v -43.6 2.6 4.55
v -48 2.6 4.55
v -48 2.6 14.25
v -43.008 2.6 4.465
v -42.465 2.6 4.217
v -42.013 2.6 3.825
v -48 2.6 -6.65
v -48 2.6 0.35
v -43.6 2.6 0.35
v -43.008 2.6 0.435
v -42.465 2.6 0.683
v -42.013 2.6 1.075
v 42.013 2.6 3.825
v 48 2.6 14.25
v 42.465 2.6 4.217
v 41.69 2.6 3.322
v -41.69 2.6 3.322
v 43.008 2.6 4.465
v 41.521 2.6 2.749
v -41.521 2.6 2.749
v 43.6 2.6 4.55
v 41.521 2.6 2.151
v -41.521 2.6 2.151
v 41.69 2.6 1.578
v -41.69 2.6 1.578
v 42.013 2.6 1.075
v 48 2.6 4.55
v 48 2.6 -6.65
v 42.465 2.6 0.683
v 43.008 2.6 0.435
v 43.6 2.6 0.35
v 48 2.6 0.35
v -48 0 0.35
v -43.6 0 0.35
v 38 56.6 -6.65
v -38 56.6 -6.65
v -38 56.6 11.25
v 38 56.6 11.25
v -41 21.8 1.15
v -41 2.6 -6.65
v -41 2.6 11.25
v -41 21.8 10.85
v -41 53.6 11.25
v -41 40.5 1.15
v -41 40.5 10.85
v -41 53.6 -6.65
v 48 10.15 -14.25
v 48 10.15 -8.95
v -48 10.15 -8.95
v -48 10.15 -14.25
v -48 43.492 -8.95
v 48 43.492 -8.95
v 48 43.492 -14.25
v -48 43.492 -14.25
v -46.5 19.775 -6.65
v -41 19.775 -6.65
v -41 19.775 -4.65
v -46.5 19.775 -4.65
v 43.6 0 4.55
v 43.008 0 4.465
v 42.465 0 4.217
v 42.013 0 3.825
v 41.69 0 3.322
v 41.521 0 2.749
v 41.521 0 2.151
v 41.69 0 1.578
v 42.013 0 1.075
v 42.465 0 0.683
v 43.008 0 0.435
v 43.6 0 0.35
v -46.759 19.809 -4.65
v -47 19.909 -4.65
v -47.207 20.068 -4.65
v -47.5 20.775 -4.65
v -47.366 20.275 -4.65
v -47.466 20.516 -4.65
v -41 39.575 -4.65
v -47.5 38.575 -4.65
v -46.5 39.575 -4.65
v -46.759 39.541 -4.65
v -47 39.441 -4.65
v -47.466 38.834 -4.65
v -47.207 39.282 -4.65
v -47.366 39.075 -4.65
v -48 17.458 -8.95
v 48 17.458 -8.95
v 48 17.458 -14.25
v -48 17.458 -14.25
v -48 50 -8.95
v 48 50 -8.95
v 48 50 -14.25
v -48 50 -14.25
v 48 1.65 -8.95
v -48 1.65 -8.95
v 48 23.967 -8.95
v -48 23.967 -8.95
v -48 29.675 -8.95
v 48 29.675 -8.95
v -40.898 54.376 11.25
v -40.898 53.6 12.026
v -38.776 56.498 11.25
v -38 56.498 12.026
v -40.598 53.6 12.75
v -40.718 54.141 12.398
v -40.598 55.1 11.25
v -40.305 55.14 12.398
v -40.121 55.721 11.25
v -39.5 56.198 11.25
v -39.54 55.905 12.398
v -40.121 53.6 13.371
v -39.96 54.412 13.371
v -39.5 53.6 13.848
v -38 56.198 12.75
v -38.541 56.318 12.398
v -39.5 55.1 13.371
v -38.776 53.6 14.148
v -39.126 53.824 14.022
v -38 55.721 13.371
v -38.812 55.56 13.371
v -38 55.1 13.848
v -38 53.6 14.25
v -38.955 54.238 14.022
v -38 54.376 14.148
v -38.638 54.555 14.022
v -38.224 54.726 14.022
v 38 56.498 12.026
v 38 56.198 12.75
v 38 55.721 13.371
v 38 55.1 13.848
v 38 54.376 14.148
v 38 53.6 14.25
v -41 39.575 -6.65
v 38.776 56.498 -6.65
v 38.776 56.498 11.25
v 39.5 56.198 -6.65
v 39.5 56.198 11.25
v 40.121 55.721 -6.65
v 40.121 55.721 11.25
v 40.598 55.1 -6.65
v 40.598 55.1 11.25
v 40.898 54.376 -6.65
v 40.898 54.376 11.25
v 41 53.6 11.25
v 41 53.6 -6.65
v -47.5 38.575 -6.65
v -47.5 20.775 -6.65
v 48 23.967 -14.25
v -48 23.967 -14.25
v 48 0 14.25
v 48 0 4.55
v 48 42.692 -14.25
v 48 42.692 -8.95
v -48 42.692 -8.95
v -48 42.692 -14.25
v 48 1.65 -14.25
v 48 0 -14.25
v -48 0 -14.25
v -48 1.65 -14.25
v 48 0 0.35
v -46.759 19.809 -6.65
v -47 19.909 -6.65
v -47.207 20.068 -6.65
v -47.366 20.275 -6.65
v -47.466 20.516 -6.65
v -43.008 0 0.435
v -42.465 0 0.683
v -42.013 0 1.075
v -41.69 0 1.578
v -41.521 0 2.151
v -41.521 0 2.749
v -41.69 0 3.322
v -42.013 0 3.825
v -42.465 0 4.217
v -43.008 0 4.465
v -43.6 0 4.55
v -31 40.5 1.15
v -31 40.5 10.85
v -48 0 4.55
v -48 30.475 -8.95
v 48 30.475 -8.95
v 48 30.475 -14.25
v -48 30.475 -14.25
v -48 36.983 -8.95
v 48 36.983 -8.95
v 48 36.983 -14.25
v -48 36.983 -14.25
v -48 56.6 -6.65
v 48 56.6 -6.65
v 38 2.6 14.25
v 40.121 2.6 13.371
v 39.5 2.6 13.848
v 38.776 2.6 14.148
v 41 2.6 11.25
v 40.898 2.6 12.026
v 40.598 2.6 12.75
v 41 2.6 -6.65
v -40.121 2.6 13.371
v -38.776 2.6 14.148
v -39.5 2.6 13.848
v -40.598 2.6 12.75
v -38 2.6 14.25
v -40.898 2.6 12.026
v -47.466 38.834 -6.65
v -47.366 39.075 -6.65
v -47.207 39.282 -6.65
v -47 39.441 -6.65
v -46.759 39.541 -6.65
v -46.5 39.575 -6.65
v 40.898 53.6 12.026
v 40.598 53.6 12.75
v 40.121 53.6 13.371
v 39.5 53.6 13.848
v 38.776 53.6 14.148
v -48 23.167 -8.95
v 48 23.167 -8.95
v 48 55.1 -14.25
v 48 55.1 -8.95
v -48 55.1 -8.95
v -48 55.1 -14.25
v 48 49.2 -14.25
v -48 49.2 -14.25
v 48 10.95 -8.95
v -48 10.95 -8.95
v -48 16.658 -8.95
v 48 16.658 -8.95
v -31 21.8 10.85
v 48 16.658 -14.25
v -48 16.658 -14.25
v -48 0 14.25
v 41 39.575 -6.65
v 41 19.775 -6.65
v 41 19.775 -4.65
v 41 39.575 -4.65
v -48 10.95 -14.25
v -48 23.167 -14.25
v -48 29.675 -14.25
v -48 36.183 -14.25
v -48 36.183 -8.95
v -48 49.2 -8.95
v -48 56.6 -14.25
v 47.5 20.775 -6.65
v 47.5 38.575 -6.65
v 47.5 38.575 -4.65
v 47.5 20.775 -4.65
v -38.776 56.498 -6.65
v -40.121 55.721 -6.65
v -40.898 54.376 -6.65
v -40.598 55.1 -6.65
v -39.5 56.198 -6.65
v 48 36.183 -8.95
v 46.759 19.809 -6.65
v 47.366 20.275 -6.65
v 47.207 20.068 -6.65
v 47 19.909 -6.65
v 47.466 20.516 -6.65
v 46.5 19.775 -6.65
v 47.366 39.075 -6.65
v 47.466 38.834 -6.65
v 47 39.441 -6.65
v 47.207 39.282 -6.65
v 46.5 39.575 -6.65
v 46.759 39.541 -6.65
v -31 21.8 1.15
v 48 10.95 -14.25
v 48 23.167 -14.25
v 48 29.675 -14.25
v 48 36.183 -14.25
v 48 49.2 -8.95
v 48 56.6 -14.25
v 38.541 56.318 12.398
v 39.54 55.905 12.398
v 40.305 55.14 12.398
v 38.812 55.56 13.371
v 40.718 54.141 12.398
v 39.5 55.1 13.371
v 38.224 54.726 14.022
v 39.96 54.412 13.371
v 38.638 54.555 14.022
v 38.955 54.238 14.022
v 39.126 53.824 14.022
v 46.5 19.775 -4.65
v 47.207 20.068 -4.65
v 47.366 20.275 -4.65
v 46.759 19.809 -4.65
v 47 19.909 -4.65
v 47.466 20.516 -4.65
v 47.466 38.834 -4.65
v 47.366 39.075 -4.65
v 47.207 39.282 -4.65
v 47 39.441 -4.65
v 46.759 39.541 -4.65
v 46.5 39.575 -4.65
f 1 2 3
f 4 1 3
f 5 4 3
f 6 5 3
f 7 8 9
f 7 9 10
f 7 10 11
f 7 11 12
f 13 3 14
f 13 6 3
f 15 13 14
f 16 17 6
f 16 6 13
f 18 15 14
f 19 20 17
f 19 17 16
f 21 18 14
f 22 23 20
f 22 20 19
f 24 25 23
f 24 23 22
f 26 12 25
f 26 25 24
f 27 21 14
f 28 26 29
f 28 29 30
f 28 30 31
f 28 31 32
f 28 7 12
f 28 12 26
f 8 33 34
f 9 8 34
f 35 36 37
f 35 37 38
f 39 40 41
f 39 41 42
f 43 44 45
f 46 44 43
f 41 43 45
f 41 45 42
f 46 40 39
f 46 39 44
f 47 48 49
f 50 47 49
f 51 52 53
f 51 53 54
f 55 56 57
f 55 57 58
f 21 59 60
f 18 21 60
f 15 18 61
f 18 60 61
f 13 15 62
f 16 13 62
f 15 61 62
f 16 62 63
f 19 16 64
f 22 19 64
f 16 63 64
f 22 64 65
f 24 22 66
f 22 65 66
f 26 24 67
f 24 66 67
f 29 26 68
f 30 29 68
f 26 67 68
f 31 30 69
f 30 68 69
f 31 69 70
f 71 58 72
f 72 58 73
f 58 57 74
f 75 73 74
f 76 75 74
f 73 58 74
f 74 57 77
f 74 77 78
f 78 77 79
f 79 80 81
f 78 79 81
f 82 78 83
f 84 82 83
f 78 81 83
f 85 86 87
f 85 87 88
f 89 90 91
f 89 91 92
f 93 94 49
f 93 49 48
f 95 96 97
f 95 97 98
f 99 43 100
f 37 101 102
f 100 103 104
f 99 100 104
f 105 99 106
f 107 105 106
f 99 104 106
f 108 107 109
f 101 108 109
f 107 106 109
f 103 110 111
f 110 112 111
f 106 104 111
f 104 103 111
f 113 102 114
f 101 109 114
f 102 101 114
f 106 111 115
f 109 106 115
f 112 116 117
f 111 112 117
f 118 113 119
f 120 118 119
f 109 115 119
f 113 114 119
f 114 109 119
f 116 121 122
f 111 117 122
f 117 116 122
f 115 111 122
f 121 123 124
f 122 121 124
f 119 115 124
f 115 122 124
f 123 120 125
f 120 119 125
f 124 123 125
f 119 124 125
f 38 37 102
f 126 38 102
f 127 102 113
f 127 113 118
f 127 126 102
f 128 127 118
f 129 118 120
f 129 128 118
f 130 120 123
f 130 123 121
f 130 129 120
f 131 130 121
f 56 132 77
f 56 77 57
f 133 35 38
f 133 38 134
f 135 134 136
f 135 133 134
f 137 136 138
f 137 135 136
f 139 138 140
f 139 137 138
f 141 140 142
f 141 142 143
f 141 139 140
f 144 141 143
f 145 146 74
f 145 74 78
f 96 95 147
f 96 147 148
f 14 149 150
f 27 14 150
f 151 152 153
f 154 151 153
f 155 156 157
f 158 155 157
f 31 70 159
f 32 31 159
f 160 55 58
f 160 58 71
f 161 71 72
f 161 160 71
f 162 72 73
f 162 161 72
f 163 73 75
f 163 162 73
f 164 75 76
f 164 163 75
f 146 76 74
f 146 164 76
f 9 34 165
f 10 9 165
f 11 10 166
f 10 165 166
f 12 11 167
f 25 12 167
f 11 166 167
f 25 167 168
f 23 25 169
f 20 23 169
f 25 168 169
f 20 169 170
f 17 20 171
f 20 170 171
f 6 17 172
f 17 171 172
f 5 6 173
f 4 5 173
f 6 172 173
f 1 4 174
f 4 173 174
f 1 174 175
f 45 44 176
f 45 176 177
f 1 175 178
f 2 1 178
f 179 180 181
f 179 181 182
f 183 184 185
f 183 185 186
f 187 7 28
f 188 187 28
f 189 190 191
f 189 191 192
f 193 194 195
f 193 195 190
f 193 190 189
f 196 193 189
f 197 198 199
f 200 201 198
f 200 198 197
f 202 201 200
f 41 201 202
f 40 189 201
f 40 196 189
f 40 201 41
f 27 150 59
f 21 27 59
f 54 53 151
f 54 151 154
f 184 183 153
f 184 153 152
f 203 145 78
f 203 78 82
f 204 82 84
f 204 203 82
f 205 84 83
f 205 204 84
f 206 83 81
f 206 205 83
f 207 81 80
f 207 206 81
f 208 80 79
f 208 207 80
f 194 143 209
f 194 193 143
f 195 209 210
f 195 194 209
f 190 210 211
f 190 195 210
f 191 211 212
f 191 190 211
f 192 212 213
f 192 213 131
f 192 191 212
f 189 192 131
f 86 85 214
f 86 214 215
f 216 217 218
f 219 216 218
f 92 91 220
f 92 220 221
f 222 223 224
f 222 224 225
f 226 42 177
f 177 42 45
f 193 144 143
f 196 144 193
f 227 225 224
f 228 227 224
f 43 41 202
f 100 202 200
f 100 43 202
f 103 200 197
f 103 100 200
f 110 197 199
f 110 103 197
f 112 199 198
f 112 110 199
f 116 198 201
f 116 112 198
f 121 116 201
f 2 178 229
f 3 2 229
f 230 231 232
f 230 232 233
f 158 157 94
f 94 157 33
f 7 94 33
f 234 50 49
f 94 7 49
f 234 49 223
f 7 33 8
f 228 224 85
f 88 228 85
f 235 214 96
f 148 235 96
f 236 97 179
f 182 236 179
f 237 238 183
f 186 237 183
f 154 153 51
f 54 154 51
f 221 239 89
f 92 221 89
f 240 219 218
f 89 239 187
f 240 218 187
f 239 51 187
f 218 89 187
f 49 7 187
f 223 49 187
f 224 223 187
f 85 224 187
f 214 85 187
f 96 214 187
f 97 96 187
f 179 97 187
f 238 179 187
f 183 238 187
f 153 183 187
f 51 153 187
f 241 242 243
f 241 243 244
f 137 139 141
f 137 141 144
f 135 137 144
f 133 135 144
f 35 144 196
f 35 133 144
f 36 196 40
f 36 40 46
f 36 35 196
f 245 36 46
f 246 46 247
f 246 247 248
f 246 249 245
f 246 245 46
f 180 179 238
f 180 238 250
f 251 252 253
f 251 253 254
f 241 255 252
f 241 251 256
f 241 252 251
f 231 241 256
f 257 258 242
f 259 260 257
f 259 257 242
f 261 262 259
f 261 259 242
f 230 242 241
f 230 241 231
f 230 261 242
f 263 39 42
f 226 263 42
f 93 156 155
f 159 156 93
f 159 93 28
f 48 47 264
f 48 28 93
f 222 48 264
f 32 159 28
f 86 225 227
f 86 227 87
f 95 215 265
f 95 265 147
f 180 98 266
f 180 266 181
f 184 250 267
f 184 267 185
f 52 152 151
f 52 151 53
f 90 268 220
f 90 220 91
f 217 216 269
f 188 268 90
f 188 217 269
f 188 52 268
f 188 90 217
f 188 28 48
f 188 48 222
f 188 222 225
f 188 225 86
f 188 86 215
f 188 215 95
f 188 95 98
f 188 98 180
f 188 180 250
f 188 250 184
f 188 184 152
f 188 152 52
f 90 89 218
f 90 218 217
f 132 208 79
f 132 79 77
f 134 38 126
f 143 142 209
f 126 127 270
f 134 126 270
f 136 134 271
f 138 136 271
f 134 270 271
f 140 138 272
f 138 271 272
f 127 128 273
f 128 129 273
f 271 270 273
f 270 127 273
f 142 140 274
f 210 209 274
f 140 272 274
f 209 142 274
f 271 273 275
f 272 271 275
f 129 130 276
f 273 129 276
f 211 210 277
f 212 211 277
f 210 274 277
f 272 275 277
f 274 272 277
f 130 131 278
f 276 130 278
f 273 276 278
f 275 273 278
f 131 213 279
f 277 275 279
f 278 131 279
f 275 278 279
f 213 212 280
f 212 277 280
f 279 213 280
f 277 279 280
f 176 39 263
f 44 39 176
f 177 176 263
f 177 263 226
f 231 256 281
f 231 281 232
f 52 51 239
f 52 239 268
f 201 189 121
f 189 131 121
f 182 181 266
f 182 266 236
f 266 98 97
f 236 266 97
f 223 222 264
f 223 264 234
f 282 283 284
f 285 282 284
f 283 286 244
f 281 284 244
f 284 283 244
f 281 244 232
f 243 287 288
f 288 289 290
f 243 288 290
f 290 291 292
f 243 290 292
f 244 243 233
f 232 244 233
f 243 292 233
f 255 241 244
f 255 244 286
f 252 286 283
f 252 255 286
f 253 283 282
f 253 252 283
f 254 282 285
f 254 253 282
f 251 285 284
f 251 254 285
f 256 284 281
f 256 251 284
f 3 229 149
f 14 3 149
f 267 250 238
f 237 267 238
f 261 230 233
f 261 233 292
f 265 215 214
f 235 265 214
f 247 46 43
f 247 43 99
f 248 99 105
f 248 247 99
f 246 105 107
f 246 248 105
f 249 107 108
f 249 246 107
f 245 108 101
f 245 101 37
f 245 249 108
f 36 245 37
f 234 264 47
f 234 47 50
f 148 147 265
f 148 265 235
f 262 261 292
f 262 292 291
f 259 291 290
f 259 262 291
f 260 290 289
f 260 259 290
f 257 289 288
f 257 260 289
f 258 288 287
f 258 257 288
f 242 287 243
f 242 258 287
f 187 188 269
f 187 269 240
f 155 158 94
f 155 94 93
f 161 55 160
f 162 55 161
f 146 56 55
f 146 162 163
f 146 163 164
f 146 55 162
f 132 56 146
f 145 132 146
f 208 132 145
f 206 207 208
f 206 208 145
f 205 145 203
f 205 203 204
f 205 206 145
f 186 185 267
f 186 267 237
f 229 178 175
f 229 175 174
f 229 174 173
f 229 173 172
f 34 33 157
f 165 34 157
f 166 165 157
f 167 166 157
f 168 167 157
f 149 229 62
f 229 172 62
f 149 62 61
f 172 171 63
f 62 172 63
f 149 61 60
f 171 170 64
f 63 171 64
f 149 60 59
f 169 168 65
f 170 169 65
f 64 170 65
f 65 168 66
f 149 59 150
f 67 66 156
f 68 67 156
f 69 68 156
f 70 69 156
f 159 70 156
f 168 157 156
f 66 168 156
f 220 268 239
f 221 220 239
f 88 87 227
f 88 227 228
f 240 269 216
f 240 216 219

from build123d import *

# Parameters (mm, degrees)
RESSALTO_EXTRUS_O1_DEPTH   = 2.6
ESBO_O2_W                  = 96
ESBO_O2_H                  = 2.3
RESSALTO_EXTRUS_O2_DEPTH   = 54
ESBO_O3_W                  = 96
ESBO_O3_H                  = 5.3
CORTE_EXTRUS_O1_DEPTH      = 0.95
ESBO_O4_W                  = 96
ESBO_O4_H                  = 1.5
RESSALTO_EXTRUS_O3_DEPTH   = 5.3
ESBO_O5_W                  = 96
ESBO_O5_H                  = 0.8
EXTRUS_O_FINA1_DEPTH       = 5.3
RESSALTO_EXTRUS_O4_DEPTH   = 20.9
FILETE1_R                  = 3
ESBO_O7_W                  = 9.7
ESBO_O7_H                  = 18.7
CORTE_EXTRUS_O2_DEPTH      = 10
RESSALTO_EXTRUS_O5_DEPTH   = 2
RESSALTO_EXTRUS_O5_2_DEPTH = 2


with BuildPart() as part:
    # Esboço1 → Ressalto-extrusão1 (new body)
    with BuildSketch(Plane(origin=(0, 0, 0), x_dir=(1, 0, 0), z_dir=(0, 1, 0))):
        with BuildLine():
            Line((-48, -0.35), (-43.6, -0.35))
            ThreePointArc((-43.6, -0.35), (-41.5, -2.45), (-43.6, -4.55))
            Line((-43.6, -4.55), (-48, -4.55))
            Line((-48, -4.55), (-48, -14.25))
            Line((-48, -14.25), (48, -14.25))
            Line((48, -14.25), (48, -4.55))
            Line((48, -4.55), (43.6, -4.55))
            ThreePointArc((43.6, -4.55), (41.5, -2.45), (43.6, -0.35))
            Line((43.6, -0.35), (48, -0.35))
            Line((48, -0.35), (48, 14.25))
            Line((48, 14.25), (-48, 14.25))
            Line((-48, 14.25), (-48, -0.35))
        make_face()
    extrude(amount=RESSALTO_EXTRUS_O1_DEPTH)

    # Esboço2 → Ressalto-extrusão2 (add)
    with BuildSketch(Plane(origin=(0, 2.6, 0), x_dir=(1, 0, 0), z_dir=(0, 1, 0))):
        with Locations((0, 7.8)):
            Rectangle(ESBO_O2_W, ESBO_O2_H)
    extrude(amount=RESSALTO_EXTRUS_O2_DEPTH)

    # Esboço3 → Corte-extrusão1 (cut)
    with BuildSketch(Plane(origin=(0, 2.6, 0), x_dir=(1, 0, 0), z_dir=(0, 1, 0))):
        with Locations((0, 11.6)):
            Rectangle(ESBO_O3_W, ESBO_O3_H)
    extrude(amount=-CORTE_EXTRUS_O1_DEPTH, mode=Mode.SUBTRACT)

    # Esboço4 → Ressalto-extrusão3 (add)
    with BuildSketch(Plane(origin=(0, 0, -8.95), x_dir=(-1, 0, 0), z_dir=(0, 0, -1))):
        with Locations((0, 55.85)):
            Rectangle(ESBO_O4_W, ESBO_O4_H)
    extrude(amount=RESSALTO_EXTRUS_O3_DEPTH)

    # Esboço5 → Extrusão-Fina1 (add)
    with BuildSketch(Plane(origin=(0, 0, -8.95), x_dir=(-1, 0, 0), z_dir=(0, 0, -1))):
        with Locations((0, 49.6)):
            Rectangle(ESBO_O5_W, ESBO_O5_H)
        with Locations((0, 43.091666667)):
            Rectangle(ESBO_O5_W, ESBO_O5_H)
        with Locations((0, 36.583333333)):
            Rectangle(ESBO_O5_W, ESBO_O5_H)
        with Locations((0, 30.075)):
            Rectangle(ESBO_O5_W, ESBO_O5_H)
        with Locations((0, 23.566666667)):
            Rectangle(ESBO_O5_W, ESBO_O5_H)
        with Locations((0, 17.058333333)):
            Rectangle(ESBO_O5_W, ESBO_O5_H)
        with Locations((0, 10.55)):
            Rectangle(ESBO_O5_W, ESBO_O5_H)
    extrude(amount=EXTRUS_O_FINA1_DEPTH)


with BuildPart() as body_2:
    # Esboço6 → Ressalto-extrusão4 (new body)
    with BuildSketch(Plane.XY.offset(-6.65)):
        with BuildLine():
            Line((-38, 56.6), (38, 56.6))
            ThreePointArc((38, 56.6), (40.121320344, 55.721320344), (41, 53.6))
            Line((41, 53.6), (41, 2.6))
            Line((41, 2.6), (-41, 2.6))
            Line((-41, 2.6), (-41, 53.6))
            ThreePointArc((-41, 53.6), (-40.121320344, 55.721320344), (-38, 56.6))
        make_face()
    extrude(amount=RESSALTO_EXTRUS_O4_DEPTH)

    # Filete1
    filete1_edges = [body_2.edges().sort_by_distance(p)[0] for p in [
        (41, 28.1, 14.25),
        (40.121320344, 55.721320344, 14.25),
        (0, 56.6, 14.25),
        (-40.121320344, 55.721320344, 14.25),
        (-41, 28.1, 14.25),
    ]]
    fillet(filete1_edges, radius=FILETE1_R)

    # Esboço7 → Corte-extrusão2 (cut)
    with BuildSketch(Plane.ZY.offset(41)):
        with Locations((6, 31.15)):
            Rectangle(ESBO_O7_W, ESBO_O7_H)
    extrude(amount=-CORTE_EXTRUS_O2_DEPTH, mode=Mode.SUBTRACT)


with BuildPart() as body_3:
    # Esboço8 → Ressalto-extrusão5 (new body)
    with BuildSketch(Plane.XY.offset(-6.65)):
        with BuildLine():
            Line((-46.5, 39.575), (-41, 39.575))
            Line((-41, 39.575), (-41, 19.775))
            Line((-41, 19.775), (-46.5, 19.775))
            ThreePointArc((-46.5, 19.775), (-47.207106781, 20.067893219), (-47.5, 20.775))
            Line((-47.5, 20.775), (-47.5, 38.575))
            ThreePointArc((-47.5, 38.575), (-47.207106781, 39.282106781), (-46.5, 39.575))
        make_face()
    extrude(amount=RESSALTO_EXTRUS_O5_DEPTH)


with BuildPart() as body_4:
    # Esboço8 → Ressalto-extrus_o5 2 (new body)
    with BuildSketch(Plane.XY.offset(-6.65)):
        with BuildLine():
            Line((46.5, 19.775), (41, 19.775))
            Line((41, 19.775), (41, 39.575))
            Line((41, 39.575), (46.5, 39.575))
            ThreePointArc((46.5, 39.575), (47.207106781, 39.282106781), (47.5, 38.575))
            Line((47.5, 38.575), (47.5, 20.775))
            ThreePointArc((47.5, 20.775), (47.207106781, 20.067893219), (46.5, 19.775))
        make_face()
    extrude(amount=RESSALTO_EXTRUS_O5_2_DEPTH)


solid = Compound([part.part, body_2.part, body_3.part, body_4.part])
